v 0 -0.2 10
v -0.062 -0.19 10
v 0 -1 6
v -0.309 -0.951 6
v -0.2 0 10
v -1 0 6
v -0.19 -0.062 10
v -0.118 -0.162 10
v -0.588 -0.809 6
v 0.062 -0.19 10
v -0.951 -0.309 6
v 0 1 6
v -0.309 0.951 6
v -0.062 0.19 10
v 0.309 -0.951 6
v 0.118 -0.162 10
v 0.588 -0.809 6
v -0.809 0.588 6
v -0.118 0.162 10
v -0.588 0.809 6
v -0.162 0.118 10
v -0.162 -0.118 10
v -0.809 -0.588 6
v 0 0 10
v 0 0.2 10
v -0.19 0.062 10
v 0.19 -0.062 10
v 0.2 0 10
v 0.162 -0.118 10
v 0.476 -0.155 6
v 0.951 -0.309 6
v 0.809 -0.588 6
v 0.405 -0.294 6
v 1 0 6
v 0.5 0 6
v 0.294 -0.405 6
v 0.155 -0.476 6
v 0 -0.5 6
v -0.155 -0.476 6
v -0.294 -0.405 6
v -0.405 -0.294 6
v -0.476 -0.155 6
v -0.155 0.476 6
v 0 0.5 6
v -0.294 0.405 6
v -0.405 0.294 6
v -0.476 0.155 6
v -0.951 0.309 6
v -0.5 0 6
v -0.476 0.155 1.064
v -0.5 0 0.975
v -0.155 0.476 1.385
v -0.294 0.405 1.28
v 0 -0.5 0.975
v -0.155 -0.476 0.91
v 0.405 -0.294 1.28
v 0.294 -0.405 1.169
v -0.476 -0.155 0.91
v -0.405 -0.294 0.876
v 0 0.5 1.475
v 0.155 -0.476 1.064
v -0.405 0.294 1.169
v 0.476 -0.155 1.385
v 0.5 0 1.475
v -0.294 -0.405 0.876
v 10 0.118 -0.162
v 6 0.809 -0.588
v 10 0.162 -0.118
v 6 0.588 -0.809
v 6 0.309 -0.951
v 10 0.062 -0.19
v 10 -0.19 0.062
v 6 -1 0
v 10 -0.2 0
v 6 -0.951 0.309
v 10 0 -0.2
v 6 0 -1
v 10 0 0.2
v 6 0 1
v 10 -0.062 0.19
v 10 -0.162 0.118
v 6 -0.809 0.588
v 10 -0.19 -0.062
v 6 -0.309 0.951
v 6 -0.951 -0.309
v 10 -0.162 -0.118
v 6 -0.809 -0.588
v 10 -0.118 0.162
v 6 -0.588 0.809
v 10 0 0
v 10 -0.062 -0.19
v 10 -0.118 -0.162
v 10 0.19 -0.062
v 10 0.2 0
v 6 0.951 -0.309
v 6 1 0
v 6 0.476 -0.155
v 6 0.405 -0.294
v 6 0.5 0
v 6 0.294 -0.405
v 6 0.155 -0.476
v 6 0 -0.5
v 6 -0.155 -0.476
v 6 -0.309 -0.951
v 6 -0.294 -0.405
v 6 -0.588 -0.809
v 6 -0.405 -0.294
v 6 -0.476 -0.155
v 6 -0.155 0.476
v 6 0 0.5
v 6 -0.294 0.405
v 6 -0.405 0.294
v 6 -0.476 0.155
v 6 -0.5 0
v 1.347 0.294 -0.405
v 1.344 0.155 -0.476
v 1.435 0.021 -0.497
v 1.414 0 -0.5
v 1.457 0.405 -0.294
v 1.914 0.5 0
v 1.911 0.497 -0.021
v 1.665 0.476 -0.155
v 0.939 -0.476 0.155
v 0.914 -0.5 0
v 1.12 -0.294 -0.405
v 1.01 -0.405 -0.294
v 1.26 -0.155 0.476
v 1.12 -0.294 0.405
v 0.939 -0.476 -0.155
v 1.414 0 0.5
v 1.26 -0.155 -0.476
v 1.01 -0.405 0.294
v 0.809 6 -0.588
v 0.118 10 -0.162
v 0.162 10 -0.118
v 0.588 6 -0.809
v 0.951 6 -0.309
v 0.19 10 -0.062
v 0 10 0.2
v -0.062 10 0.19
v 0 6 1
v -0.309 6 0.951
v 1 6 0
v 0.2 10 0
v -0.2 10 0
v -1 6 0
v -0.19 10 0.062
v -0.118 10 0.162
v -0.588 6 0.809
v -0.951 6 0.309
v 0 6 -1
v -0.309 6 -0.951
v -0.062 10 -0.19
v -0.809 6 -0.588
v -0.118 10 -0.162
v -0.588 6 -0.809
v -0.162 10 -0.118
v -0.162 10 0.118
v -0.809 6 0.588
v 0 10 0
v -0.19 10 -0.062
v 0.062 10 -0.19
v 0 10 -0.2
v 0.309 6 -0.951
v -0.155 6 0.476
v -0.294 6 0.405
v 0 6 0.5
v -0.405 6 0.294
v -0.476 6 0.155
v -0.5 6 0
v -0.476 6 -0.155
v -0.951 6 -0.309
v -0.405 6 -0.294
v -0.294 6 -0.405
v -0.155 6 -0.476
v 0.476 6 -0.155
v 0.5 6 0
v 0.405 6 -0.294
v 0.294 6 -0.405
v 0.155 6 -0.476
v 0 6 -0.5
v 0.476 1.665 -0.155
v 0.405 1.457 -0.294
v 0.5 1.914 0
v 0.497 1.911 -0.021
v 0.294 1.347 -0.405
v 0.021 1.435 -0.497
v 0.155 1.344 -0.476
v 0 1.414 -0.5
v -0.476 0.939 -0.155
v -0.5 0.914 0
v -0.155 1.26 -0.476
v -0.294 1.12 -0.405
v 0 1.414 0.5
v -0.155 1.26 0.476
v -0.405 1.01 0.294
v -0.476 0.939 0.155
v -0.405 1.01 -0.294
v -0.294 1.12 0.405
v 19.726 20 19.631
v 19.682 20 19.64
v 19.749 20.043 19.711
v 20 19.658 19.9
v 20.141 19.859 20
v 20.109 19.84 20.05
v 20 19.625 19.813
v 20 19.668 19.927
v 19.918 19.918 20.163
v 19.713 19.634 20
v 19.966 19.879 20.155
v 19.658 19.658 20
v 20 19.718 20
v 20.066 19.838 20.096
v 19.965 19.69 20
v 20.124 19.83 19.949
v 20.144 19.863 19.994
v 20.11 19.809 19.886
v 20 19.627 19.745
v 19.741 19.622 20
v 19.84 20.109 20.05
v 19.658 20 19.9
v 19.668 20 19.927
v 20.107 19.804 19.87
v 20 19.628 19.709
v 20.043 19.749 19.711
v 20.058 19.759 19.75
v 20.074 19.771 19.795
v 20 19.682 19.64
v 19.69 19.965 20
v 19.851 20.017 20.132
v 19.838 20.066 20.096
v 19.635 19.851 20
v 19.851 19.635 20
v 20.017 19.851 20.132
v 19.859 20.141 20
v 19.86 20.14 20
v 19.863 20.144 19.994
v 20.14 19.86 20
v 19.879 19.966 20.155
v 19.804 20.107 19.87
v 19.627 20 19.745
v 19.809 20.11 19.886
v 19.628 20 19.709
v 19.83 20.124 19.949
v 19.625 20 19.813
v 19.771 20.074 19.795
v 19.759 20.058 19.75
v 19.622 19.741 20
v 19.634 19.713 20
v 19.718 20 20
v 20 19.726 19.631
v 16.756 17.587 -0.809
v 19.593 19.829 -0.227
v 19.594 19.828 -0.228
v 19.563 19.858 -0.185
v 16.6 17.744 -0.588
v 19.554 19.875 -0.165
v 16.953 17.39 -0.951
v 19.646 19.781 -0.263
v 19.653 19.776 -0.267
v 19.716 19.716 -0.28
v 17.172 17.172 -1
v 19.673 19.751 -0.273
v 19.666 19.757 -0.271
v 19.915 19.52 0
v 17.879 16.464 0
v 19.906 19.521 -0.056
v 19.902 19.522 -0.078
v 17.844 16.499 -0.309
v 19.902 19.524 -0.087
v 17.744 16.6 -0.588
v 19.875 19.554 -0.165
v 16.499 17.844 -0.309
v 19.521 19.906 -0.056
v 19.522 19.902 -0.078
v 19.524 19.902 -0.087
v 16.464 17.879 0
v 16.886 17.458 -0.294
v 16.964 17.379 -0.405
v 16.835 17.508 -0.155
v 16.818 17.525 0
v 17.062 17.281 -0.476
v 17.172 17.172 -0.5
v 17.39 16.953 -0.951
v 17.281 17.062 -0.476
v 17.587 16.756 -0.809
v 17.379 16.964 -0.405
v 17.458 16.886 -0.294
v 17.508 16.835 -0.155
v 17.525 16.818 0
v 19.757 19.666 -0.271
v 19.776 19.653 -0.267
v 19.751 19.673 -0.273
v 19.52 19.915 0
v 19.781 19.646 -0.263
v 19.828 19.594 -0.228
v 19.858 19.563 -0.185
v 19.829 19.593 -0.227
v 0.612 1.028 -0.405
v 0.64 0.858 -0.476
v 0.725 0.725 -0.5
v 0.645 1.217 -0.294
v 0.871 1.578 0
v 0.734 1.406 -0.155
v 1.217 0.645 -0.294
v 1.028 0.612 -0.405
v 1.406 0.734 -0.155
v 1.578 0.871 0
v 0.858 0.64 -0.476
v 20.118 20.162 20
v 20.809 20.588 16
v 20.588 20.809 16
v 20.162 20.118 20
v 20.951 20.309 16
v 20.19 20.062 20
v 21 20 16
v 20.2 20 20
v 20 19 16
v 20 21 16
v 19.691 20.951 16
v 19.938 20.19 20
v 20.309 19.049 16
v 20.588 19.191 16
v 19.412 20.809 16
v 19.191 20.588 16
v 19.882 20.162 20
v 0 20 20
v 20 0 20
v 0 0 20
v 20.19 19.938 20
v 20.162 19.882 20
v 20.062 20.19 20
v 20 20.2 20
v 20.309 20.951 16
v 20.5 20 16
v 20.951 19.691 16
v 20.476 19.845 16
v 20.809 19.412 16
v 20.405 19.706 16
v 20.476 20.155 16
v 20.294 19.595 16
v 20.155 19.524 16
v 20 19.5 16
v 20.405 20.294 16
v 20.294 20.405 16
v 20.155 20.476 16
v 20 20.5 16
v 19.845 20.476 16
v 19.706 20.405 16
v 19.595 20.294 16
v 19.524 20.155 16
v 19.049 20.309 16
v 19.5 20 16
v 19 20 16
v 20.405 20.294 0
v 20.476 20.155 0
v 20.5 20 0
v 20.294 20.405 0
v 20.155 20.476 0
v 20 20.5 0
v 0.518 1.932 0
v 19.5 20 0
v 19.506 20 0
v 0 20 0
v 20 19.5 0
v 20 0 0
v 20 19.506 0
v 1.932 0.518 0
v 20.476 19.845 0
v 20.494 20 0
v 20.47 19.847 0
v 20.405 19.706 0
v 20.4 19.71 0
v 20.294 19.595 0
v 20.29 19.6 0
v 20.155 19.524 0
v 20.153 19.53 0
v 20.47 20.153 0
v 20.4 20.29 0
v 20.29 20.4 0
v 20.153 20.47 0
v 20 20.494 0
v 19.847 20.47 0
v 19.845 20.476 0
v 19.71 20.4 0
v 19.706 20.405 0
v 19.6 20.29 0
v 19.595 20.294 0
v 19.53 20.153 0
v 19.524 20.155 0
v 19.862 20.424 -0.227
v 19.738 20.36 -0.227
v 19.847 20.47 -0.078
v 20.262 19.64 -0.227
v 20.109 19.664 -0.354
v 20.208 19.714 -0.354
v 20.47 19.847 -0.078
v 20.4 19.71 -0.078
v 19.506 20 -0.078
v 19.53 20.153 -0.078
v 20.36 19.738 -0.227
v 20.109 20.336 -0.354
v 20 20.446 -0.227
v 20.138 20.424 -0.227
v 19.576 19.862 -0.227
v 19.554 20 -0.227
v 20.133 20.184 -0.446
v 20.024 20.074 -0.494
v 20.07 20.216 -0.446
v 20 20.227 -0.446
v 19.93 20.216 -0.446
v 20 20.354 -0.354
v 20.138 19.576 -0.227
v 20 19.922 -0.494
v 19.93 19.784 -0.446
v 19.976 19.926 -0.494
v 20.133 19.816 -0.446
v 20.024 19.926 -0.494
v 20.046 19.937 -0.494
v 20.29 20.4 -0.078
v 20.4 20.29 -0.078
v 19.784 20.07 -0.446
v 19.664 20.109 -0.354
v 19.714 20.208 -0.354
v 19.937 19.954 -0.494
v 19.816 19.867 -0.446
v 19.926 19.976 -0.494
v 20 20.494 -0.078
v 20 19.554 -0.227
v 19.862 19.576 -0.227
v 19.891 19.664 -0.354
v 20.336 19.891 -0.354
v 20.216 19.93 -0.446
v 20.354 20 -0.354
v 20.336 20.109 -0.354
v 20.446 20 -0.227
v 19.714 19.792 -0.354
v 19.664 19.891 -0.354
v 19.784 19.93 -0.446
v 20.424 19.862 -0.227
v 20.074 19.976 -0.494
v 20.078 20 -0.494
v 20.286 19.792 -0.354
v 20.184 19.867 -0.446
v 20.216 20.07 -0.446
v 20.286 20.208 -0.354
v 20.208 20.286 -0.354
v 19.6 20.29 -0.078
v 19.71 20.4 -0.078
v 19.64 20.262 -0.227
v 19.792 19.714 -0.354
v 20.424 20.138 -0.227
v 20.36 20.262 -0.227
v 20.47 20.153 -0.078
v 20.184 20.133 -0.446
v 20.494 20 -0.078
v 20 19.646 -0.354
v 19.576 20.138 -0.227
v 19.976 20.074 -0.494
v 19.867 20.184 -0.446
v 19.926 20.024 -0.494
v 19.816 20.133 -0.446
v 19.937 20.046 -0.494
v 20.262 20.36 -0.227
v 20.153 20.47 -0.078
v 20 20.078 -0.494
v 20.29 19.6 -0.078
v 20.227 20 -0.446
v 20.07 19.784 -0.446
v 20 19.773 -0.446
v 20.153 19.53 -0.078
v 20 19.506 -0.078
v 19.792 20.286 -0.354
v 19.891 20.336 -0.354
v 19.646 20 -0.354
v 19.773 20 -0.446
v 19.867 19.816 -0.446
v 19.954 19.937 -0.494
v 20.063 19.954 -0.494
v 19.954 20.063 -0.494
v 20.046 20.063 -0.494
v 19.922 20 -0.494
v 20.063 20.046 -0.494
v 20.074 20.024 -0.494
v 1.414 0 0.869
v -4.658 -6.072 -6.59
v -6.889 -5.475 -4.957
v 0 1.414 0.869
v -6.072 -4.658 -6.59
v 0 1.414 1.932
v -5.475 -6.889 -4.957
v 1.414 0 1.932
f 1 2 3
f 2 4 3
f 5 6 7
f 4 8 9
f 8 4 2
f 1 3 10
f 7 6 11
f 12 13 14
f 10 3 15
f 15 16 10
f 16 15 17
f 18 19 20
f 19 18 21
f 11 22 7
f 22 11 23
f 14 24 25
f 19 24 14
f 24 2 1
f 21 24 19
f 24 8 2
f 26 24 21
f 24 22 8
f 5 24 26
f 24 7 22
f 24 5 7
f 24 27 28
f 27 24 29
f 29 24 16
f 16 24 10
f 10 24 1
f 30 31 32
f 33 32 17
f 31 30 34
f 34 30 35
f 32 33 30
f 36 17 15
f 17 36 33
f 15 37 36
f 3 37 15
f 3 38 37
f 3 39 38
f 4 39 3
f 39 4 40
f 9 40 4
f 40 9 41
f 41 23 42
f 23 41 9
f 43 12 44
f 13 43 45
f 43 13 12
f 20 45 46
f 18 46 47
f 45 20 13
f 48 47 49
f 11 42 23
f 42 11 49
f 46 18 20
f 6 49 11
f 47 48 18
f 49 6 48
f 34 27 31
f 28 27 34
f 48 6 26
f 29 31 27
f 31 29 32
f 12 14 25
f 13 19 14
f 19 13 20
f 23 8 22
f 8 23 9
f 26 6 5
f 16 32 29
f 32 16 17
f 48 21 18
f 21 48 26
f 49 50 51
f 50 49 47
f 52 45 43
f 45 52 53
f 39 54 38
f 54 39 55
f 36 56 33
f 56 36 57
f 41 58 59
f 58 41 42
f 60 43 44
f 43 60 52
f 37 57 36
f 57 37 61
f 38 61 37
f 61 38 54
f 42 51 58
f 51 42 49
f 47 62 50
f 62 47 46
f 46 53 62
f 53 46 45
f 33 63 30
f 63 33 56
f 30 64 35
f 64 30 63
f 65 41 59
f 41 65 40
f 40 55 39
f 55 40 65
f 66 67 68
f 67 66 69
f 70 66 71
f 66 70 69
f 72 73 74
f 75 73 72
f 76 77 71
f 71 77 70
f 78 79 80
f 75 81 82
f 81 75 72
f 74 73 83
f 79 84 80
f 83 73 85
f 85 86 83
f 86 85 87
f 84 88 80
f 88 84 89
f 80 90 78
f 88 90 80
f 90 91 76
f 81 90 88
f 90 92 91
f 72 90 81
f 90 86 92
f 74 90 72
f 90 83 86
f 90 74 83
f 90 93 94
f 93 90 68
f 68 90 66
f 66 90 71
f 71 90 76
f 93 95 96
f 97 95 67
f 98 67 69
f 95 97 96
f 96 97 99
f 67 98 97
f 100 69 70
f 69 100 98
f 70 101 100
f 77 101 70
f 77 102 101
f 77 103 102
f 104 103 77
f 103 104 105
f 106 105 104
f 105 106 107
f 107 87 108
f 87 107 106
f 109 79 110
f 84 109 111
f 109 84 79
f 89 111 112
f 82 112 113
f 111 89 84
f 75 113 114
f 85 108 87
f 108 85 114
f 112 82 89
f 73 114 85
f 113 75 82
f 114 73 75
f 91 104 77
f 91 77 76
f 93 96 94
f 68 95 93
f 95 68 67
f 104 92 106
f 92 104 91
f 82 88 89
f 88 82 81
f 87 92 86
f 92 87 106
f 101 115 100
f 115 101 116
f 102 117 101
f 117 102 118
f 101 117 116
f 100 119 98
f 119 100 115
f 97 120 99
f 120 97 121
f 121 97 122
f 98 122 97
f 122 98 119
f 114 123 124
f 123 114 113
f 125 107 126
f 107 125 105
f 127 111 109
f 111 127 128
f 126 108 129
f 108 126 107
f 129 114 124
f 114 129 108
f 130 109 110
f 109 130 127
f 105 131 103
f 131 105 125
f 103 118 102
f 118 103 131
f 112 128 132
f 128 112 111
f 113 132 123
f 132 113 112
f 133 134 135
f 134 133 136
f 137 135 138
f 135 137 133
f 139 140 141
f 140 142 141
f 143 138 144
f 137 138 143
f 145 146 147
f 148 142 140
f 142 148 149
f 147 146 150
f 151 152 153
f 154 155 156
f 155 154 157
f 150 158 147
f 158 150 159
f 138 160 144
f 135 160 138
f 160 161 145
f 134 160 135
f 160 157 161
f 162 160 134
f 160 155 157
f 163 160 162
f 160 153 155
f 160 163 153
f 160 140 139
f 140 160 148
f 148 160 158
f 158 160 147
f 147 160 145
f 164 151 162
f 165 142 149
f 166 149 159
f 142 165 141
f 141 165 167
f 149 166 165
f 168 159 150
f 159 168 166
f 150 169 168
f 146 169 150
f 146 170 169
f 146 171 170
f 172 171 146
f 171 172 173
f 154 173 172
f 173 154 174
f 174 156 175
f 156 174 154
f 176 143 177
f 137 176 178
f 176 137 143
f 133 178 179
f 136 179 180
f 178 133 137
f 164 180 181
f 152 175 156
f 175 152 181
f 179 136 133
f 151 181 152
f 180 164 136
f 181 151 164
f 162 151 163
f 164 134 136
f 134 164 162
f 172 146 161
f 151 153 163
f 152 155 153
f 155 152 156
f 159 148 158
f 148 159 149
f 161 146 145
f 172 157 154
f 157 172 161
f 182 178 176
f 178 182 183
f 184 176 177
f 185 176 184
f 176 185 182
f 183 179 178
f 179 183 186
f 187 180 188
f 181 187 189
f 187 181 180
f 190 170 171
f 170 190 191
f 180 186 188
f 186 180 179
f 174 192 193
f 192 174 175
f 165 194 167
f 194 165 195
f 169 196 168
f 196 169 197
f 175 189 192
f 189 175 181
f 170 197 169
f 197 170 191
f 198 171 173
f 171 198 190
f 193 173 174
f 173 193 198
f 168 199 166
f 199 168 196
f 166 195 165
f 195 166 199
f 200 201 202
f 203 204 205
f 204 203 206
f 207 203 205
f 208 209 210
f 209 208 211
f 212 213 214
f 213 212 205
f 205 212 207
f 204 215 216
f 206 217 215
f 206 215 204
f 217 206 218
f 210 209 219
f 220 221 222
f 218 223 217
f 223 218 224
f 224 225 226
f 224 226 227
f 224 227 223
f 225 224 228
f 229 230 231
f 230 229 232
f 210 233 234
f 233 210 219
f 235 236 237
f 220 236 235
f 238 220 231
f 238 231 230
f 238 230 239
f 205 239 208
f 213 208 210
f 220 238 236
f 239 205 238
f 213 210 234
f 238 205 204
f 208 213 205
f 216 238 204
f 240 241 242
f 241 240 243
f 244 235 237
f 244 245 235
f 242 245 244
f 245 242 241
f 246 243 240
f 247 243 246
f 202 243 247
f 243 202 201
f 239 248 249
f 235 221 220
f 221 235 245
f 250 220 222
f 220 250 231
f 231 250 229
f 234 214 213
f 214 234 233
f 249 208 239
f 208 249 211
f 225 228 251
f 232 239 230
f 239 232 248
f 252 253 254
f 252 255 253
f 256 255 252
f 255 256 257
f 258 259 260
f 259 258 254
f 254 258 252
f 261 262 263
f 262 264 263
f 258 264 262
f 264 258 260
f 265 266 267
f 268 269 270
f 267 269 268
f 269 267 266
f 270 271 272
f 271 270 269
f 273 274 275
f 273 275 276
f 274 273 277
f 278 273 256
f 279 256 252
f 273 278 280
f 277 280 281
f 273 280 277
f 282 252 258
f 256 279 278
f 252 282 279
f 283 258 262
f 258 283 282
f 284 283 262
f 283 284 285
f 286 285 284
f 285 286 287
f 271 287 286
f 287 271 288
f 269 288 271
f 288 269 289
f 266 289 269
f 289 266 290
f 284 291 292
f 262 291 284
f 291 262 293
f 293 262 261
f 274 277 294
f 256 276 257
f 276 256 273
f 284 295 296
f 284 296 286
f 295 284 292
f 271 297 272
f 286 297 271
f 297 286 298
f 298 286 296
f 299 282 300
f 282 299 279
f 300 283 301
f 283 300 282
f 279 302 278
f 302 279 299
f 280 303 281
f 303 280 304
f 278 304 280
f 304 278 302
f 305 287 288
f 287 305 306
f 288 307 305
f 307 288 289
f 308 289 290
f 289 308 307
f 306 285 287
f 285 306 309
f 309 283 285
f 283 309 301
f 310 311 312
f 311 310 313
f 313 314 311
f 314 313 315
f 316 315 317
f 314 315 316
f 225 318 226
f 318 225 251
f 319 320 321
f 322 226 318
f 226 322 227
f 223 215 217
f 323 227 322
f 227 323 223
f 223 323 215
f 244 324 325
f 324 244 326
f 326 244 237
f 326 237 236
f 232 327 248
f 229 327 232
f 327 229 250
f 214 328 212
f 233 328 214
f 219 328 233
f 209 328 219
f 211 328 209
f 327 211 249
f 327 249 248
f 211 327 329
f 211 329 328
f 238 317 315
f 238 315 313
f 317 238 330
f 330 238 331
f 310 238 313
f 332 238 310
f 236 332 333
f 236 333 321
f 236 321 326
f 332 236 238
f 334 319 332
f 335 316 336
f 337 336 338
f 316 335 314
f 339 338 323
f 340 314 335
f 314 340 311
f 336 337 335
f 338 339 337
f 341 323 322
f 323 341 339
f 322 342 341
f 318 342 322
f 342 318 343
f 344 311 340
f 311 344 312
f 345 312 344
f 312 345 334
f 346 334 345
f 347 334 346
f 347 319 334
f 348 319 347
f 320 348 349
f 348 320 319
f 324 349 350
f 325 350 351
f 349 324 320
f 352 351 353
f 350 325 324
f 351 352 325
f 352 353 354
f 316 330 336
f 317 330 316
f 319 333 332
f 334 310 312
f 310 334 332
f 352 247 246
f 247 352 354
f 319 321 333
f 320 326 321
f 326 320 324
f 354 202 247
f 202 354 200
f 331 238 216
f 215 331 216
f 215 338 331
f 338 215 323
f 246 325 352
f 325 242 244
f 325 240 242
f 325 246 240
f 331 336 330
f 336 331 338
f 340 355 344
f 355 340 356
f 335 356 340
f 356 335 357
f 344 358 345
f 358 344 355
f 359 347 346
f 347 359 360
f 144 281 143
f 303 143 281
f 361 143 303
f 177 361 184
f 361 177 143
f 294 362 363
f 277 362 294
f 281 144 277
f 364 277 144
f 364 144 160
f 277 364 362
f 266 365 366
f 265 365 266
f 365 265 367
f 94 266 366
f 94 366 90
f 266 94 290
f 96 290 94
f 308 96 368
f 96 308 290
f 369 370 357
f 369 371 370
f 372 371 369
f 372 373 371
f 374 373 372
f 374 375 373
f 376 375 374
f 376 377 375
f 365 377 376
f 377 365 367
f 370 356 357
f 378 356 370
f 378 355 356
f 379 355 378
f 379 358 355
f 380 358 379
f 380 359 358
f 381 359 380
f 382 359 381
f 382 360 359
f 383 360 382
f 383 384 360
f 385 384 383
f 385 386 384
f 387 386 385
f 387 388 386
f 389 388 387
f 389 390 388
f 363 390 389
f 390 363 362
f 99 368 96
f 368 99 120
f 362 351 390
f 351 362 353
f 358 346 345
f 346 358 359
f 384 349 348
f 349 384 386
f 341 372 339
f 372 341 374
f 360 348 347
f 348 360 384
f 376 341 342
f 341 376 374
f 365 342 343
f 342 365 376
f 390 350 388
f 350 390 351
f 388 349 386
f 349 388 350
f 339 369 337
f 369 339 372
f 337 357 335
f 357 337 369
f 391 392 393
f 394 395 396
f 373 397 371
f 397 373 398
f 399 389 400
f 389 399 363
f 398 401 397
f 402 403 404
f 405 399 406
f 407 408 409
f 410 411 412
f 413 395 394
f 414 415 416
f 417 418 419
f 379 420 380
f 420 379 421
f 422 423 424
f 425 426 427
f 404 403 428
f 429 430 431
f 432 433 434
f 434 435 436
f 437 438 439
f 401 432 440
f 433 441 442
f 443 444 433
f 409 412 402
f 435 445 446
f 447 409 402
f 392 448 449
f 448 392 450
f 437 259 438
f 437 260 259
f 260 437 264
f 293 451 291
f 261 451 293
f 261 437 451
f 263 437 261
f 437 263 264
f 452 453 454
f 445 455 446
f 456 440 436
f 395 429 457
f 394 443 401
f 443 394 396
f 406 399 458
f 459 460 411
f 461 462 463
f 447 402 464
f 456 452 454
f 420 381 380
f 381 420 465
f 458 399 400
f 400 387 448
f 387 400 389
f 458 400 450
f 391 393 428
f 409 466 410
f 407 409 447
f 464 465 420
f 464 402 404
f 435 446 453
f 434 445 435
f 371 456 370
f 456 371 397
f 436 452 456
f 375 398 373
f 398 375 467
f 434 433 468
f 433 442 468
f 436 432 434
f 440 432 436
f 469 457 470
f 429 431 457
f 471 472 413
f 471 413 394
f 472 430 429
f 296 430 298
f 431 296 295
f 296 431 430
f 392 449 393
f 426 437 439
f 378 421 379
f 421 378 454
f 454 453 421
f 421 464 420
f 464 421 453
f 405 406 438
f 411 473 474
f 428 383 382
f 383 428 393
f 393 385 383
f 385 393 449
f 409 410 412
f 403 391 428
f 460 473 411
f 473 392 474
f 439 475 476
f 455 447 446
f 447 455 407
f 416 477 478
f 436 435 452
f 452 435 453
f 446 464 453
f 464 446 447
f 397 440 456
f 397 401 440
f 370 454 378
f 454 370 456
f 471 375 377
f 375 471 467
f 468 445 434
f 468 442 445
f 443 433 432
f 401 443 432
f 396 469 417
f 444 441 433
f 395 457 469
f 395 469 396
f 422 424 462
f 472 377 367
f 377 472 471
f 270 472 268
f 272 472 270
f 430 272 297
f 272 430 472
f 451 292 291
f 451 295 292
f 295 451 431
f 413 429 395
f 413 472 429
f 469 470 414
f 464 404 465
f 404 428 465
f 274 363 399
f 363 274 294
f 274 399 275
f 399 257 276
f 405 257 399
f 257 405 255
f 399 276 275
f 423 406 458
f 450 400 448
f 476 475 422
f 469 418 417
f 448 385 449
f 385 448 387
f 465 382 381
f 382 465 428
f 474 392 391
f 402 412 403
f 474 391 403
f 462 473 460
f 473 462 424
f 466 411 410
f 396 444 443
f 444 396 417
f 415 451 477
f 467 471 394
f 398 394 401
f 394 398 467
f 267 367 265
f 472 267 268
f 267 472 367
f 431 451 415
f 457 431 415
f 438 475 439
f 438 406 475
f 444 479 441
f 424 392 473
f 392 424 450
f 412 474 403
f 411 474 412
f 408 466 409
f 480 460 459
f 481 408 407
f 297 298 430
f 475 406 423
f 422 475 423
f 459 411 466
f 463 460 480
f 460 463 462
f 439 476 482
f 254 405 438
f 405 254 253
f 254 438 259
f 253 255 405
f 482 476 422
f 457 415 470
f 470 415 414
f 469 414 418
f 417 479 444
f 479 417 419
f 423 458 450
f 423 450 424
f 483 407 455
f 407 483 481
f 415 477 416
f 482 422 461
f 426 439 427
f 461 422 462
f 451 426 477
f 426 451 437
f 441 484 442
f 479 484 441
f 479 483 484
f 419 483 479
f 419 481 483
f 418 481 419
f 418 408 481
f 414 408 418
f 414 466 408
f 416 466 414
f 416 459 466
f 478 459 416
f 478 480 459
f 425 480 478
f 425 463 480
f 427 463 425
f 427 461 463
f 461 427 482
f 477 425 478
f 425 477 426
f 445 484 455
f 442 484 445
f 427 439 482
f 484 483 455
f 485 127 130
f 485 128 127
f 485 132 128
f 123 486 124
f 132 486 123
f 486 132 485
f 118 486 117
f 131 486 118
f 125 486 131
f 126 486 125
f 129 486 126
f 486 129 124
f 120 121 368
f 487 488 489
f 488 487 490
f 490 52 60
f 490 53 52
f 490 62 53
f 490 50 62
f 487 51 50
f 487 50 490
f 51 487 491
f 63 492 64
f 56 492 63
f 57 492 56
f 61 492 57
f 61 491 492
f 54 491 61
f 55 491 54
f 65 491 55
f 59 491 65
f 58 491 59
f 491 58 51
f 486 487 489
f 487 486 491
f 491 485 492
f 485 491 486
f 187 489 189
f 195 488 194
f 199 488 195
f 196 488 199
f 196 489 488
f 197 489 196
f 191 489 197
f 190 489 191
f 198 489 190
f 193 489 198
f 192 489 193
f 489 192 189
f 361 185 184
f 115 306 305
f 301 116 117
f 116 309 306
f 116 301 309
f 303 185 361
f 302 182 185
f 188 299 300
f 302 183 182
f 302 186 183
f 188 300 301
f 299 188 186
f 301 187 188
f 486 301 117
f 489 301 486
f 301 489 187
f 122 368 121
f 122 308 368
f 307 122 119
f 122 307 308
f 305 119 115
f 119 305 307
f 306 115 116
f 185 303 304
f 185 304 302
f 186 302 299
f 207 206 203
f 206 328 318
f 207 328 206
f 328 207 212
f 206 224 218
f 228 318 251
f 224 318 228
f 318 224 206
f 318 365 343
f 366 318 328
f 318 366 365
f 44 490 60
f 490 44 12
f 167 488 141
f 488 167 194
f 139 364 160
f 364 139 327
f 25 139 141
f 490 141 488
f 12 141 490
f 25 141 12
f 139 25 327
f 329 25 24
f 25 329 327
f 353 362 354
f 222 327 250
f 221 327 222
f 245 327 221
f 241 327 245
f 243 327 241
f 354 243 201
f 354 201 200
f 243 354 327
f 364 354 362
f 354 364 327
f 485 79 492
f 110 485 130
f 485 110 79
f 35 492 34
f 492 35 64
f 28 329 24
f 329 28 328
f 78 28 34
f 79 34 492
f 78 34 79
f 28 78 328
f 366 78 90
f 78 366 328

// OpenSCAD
// file: vector.scad
//---------------------------------------------------------------
//-- Openscad vector library
//-- This is a component of the obiscad opescad tools by Obijuan
//-- (C) Juan Gonzalez-Gomez (Obijuan)
//-- Sep-2012
//---------------------------------------------------------------
//-- Released under the GPL license
//---------------------------------------------------------------

//-- Calculate the module of a vector
function mod(v) = (sqrt(v[0]*v[0]+v[1]*v[1]+v[2]*v[2]));


//------------------------------------------------------------------
//-- Draw a vector pointing to the z axis
//-- This is an auxiliary module for implementing the vector module
//--
//-- Parameters:
//--	l: total vector length (line + arrow)
//--	l_arrow: Vector arrow length
//------------------------------------------------------------------
module vectorz(l=10, l_arrow=4)
{
	//-- vector body length (not including the arrow)
	lb = l - l_arrow;

	//-- The vector is locatead at 0,0,0
	translate([0,0,lb/2])
	union() {

		//-- Draw the arrow
		translate([0,0,lb/2])
			cylinder(r1=2/2, r2=0.2, h=l_arrow, $fn=20);

		//-- Draw the body
		cylinder(r=1/2, h=lb, center=true, $fn=20);
	}

	//-- Draw a sphere in the vector base
	sphere(r=1/2, $fn=20);
}

//---------------------------------------------------------------
//-- ORIENTATE OPERATOR
//-- Orientate the child to the direction given by the vector
//-- The z axis of the child is rotate so that it points in the
//-- direction given by v
//-- 
//-- Parameters:
//--	v : Orientation vector
//--	roll: Angle to rotate the child around the v axis
//---------------------------------------------------------------
module orientate(v=[1,1,1],roll=0)
{
	//-- Get the vector coordinales and rotating angle
	x=v[0]; y=v[1]; z=v[2];
	phi_z1 = roll;
	
	//-- Perform the needed calculations
	phi_x = atan2(y,z);	//-- for case 1 (x=0)
	phi_y2 = atan2(x,z); //-- For case 2 (y=0)
	phi_z3 = atan2(y,x); //-- For case 3 (z=0)

	//-- General case
	l=sqrt(x*x+y*y);
	phi_y4 = atan2(l,z);
	phi_z4 = atan2(y,x);

	//-- Orientate the Child according to region where 
	//-- the orientation vector is located

	//-- Case 1:	The vector is on the plane x=0
	if (x==0) { 
		//echo("Case 1");			//-- For debugging 
		
		rotate([-phi_x,0,0])
			rotate([0,0,phi_z1])
				child(0);
	}

	//-- Case 2: Plane y=0
	else if (y==0) {
		//echo("Case 2");			//-- Debugging

		rotate([0,phi_y2,0])
			rotate([0,0,phi_z1])
				child(0);
	}
	//-- Case 3: Plane z=0
	else if (z==0) {
		//echo("Case 3");			//-- Debugging

		rotate([0,0,phi_z3])
		rotate([0,90,0])
			rotate([0,0,phi_z1])
				child(0);
	}
	//-- General case
	else {
		//echo("General case ");		//-- Debugging
		//echo("Phi_z4: ", phi_z4);
		//echo("Phi_y4: ",phi_y4);

		rotate([0,0,phi_z4])
			rotate([0,phi_y4,0])
				rotate([0,0,phi_z1])
					child(0);
	}
}

//---------------------------------------------------------------------------
//-- Draw a vector 
//--
//-- There are two modes of drawing the vector
//-- * Mode 1: Given by a cartesian point(x,y,z). A vector from the origin
//--					to the end (x,y,z) is drawn. The l parameter (length) must 
//--					be 0	(l=0)
//-- * Mode 2: Give by direction and length
//--					A vector of length l pointing to the direction given by
//--					v is drawn
//---------------------------------------------------------------------------
//-- Parameters:
//--	v: Vector cartesian coordinates
//--	l: total vector length (line + arrow)
//--	l_arrow: Vector arrow length
//---------------------------------------------------------------------------
module vector(v,l=0, l_arrow=4)
{
	//-- Get the vector length from the coordinates
	mod = mod(v);

	//-- Draw the vector. The vector length is given either
	//--- by the mod variable (when l=0) or by l (when l!=0)
	if (l==0)
		orientate(v) vectorz(l=mod, l_arrow=l_arrow);
	else
		orientate(v) vectorz(l=l, l_arrow=l_arrow);
}

//----------------------------------------------------
//-- Draw a Frame of reference
//-- Parameters:
//-- l: length of the Unit vectors
//-----------------------------------------------------
module frame(l=10, l_arrow=4)
{

	//-- Z unit vector
	color("Blue")
		vector([0,0,l], l_arrow=l_arrow);

	//-- X unit vector
	color("Red")
		vector([l,0,0], l_arrow=l_arrow );

	//-- Y unit vector
	color("Green")
		vector([0,l,0],l_arrow=l_arrow);

	//-- Origin
	color("Gray")
		sphere(r=1, $fn=20);
}

//------------------------------------
//-- Tests and examples
//-----------------------------------


//-- Testing that the vector library is working ok
//-- 22 vectors in total are drawn, poiting to different directions
a = 20;
k = 1;

//--	Add a frame of reference (in the origin)
frame(l=a);

//-- Negative vectors, pointing towards the three axis: -x, -y, -z
color("Red")	vector([-a, 0,	0]);
color("Green") vector([0, -a,	0]);
color("Blue")	vector([0,	0, -a]);

//-- It is *not* has been implemented using a for loop on purpose
//-- This way, individual vectors can be commented out or highlighted

//-- vectors with positive z
vector([a,	a, a*k]);
vector([0,	a, a*k]);
vector([-a,	a, a*k]);
vector([-a,	0, a*k]);

vector([-a, -a, a*k]);
vector([0,	-a, a*k]);
vector([a,	-a, a*k]);
vector([a,	0, a*k]);


//-- Vectors with negative z
vector([a,	a, -a*k]);
vector([0,	a, -a*k]);
vector([-a,	a, -a*k]);
vector([-a,	0, -a*k]);

vector([-a, -a, -a*k]);
vector([0,	-a, -a*k]);
vector([a,	-a, -a*k]);
vector([a,	0, -a*k]);


//--- Another test...
//-- Add the vector into the vector table
//-- This vectors are taken as directions
//-- All the vectors will be drawn with the same length (l)
vector_table = [
	[ 1, 1, 1],
	[ 0, 1, 1],
	[-1, 1, 1],
	[-1, 0, 1],
	[-1,-1, 1],
	[ 0,-1, 1],
	[ 1,-1, 1],
	[ 1, 0, 1],

	[ 1, 1, -1],
	[ 0, 1, -1],
	[-1, 1, -1],
	[-1, 0, -1],
	[-1,-1, -1],
	[ 0,-1, -1],
	[ 1,-1, -1],
	[ 1, 0, -1],
];

//-- Vector length
l=20;

translate([60,0,0]) {
	frame(l=10);

	//-- Draw all the vector given in the table
	//-- The vectors point to the direction given in the table
	//-- They all are drawn with a length equal to l
	for (v=vector_table) {
		//-- Vector given by direction and length
		vector(v,l=l);
	}
}
// main file
//---------------------------------------------
//-- Example of use of the vector library
//---------------------------------------------
use <vector.scad>


//-- Place a frame of reference in the origin
frame(l=10);

a = 20;

//-- Define some example vectors
v = [a,a,a];
vh = [a,a,0];  //-- Projection on the z=0 plane
vv = [0,0,a];  //-- Projection on the z axis

//-- Draw the vector
vector(v);

//-- Draw the projection on the z=0 plane
color("Gray") vector(vh);

//-- Draw the projection on the z axis, but
//-- locate it in the end of the previous vector
color("Gray") 
	translate(vh) vector(vv);

//-- Orientate a cube along the v vector
color("orange")
orientate(v=v,roll=0) 
	cube([2,2,20],center=true);

//-- Add a transparent cube
color("Gray",0.2)
	cube(a);
